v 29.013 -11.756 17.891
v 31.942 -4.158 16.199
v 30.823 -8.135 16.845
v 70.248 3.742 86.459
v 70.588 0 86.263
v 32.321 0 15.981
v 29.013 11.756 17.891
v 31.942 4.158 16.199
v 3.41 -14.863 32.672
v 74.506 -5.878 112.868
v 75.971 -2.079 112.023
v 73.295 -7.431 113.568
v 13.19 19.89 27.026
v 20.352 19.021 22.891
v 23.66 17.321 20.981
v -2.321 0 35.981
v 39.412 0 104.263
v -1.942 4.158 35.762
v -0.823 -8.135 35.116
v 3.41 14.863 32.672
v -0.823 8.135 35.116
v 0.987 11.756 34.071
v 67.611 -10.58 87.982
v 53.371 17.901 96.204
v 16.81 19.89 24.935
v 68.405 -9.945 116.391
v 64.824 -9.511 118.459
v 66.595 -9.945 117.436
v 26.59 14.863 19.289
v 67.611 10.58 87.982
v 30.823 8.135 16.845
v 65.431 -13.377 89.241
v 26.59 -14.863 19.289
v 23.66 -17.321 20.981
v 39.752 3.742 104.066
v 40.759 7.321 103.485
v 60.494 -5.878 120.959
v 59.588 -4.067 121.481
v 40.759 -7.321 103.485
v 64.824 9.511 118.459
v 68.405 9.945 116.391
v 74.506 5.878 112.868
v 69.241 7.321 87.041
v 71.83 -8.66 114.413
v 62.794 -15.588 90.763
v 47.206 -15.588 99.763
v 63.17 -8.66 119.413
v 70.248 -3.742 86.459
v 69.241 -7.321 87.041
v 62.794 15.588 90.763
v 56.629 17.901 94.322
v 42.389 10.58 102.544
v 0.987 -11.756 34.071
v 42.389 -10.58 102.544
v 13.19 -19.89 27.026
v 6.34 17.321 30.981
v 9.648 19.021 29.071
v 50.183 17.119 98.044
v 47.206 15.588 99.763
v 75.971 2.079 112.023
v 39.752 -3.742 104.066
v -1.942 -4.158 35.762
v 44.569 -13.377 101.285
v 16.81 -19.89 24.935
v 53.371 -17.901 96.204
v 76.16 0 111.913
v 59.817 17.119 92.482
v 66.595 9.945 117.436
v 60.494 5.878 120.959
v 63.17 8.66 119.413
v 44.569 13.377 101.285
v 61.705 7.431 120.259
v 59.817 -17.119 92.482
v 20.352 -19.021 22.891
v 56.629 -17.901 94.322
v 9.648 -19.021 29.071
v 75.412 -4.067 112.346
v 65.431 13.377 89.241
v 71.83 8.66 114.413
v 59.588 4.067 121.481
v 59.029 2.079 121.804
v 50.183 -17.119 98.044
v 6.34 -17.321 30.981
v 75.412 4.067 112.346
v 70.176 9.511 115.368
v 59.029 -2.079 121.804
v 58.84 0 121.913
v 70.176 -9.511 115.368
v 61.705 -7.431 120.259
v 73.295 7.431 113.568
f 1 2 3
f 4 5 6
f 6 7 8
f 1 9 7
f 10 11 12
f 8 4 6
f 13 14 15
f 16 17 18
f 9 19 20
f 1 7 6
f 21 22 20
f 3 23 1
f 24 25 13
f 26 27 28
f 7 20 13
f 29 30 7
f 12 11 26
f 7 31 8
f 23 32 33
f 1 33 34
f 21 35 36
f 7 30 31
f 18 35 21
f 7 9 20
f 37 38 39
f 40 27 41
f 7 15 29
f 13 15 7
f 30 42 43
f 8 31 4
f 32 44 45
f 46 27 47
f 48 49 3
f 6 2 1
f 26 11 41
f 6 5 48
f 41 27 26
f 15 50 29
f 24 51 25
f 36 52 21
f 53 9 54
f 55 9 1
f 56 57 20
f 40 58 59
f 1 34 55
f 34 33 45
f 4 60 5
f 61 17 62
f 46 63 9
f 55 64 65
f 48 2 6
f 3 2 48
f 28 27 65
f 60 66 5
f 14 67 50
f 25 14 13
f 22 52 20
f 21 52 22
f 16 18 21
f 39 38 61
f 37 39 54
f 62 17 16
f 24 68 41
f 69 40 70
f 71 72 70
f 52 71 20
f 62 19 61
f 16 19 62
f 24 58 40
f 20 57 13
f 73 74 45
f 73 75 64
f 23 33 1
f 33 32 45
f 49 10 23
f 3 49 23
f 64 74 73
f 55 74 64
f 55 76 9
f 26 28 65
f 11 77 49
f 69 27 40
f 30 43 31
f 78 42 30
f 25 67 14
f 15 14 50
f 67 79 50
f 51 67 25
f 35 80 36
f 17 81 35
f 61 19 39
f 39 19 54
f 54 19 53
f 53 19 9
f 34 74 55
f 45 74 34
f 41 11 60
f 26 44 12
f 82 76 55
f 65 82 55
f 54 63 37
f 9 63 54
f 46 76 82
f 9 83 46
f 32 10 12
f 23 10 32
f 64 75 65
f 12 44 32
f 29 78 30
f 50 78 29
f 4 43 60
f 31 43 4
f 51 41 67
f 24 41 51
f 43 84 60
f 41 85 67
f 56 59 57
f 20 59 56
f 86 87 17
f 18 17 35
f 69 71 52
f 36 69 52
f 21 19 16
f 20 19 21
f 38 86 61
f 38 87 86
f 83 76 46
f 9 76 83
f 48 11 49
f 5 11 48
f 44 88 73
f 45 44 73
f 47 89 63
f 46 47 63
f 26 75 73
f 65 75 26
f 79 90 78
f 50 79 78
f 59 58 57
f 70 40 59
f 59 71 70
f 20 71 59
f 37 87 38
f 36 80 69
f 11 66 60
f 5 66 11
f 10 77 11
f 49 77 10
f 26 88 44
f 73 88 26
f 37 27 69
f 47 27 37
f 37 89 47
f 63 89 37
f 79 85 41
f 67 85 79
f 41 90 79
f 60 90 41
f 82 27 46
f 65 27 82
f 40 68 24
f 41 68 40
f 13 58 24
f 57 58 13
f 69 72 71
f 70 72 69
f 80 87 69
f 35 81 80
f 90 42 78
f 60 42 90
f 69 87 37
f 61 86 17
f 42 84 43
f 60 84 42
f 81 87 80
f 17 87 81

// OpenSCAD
hull(){
     rotate(30,[0,1,0]) translate([0,0,30]) cylinder(h=40,r1=20,r2=10, center = false);
     rotate(30,[0,1,0])	translate([0,0,80]) cylinder(h=30,r1=15,r2=18, center = false);
     rotate(30,[0,1,0])	translate([0,0,105]) cylinder(h=30,r1=16,r2=10, center = false);    
}
